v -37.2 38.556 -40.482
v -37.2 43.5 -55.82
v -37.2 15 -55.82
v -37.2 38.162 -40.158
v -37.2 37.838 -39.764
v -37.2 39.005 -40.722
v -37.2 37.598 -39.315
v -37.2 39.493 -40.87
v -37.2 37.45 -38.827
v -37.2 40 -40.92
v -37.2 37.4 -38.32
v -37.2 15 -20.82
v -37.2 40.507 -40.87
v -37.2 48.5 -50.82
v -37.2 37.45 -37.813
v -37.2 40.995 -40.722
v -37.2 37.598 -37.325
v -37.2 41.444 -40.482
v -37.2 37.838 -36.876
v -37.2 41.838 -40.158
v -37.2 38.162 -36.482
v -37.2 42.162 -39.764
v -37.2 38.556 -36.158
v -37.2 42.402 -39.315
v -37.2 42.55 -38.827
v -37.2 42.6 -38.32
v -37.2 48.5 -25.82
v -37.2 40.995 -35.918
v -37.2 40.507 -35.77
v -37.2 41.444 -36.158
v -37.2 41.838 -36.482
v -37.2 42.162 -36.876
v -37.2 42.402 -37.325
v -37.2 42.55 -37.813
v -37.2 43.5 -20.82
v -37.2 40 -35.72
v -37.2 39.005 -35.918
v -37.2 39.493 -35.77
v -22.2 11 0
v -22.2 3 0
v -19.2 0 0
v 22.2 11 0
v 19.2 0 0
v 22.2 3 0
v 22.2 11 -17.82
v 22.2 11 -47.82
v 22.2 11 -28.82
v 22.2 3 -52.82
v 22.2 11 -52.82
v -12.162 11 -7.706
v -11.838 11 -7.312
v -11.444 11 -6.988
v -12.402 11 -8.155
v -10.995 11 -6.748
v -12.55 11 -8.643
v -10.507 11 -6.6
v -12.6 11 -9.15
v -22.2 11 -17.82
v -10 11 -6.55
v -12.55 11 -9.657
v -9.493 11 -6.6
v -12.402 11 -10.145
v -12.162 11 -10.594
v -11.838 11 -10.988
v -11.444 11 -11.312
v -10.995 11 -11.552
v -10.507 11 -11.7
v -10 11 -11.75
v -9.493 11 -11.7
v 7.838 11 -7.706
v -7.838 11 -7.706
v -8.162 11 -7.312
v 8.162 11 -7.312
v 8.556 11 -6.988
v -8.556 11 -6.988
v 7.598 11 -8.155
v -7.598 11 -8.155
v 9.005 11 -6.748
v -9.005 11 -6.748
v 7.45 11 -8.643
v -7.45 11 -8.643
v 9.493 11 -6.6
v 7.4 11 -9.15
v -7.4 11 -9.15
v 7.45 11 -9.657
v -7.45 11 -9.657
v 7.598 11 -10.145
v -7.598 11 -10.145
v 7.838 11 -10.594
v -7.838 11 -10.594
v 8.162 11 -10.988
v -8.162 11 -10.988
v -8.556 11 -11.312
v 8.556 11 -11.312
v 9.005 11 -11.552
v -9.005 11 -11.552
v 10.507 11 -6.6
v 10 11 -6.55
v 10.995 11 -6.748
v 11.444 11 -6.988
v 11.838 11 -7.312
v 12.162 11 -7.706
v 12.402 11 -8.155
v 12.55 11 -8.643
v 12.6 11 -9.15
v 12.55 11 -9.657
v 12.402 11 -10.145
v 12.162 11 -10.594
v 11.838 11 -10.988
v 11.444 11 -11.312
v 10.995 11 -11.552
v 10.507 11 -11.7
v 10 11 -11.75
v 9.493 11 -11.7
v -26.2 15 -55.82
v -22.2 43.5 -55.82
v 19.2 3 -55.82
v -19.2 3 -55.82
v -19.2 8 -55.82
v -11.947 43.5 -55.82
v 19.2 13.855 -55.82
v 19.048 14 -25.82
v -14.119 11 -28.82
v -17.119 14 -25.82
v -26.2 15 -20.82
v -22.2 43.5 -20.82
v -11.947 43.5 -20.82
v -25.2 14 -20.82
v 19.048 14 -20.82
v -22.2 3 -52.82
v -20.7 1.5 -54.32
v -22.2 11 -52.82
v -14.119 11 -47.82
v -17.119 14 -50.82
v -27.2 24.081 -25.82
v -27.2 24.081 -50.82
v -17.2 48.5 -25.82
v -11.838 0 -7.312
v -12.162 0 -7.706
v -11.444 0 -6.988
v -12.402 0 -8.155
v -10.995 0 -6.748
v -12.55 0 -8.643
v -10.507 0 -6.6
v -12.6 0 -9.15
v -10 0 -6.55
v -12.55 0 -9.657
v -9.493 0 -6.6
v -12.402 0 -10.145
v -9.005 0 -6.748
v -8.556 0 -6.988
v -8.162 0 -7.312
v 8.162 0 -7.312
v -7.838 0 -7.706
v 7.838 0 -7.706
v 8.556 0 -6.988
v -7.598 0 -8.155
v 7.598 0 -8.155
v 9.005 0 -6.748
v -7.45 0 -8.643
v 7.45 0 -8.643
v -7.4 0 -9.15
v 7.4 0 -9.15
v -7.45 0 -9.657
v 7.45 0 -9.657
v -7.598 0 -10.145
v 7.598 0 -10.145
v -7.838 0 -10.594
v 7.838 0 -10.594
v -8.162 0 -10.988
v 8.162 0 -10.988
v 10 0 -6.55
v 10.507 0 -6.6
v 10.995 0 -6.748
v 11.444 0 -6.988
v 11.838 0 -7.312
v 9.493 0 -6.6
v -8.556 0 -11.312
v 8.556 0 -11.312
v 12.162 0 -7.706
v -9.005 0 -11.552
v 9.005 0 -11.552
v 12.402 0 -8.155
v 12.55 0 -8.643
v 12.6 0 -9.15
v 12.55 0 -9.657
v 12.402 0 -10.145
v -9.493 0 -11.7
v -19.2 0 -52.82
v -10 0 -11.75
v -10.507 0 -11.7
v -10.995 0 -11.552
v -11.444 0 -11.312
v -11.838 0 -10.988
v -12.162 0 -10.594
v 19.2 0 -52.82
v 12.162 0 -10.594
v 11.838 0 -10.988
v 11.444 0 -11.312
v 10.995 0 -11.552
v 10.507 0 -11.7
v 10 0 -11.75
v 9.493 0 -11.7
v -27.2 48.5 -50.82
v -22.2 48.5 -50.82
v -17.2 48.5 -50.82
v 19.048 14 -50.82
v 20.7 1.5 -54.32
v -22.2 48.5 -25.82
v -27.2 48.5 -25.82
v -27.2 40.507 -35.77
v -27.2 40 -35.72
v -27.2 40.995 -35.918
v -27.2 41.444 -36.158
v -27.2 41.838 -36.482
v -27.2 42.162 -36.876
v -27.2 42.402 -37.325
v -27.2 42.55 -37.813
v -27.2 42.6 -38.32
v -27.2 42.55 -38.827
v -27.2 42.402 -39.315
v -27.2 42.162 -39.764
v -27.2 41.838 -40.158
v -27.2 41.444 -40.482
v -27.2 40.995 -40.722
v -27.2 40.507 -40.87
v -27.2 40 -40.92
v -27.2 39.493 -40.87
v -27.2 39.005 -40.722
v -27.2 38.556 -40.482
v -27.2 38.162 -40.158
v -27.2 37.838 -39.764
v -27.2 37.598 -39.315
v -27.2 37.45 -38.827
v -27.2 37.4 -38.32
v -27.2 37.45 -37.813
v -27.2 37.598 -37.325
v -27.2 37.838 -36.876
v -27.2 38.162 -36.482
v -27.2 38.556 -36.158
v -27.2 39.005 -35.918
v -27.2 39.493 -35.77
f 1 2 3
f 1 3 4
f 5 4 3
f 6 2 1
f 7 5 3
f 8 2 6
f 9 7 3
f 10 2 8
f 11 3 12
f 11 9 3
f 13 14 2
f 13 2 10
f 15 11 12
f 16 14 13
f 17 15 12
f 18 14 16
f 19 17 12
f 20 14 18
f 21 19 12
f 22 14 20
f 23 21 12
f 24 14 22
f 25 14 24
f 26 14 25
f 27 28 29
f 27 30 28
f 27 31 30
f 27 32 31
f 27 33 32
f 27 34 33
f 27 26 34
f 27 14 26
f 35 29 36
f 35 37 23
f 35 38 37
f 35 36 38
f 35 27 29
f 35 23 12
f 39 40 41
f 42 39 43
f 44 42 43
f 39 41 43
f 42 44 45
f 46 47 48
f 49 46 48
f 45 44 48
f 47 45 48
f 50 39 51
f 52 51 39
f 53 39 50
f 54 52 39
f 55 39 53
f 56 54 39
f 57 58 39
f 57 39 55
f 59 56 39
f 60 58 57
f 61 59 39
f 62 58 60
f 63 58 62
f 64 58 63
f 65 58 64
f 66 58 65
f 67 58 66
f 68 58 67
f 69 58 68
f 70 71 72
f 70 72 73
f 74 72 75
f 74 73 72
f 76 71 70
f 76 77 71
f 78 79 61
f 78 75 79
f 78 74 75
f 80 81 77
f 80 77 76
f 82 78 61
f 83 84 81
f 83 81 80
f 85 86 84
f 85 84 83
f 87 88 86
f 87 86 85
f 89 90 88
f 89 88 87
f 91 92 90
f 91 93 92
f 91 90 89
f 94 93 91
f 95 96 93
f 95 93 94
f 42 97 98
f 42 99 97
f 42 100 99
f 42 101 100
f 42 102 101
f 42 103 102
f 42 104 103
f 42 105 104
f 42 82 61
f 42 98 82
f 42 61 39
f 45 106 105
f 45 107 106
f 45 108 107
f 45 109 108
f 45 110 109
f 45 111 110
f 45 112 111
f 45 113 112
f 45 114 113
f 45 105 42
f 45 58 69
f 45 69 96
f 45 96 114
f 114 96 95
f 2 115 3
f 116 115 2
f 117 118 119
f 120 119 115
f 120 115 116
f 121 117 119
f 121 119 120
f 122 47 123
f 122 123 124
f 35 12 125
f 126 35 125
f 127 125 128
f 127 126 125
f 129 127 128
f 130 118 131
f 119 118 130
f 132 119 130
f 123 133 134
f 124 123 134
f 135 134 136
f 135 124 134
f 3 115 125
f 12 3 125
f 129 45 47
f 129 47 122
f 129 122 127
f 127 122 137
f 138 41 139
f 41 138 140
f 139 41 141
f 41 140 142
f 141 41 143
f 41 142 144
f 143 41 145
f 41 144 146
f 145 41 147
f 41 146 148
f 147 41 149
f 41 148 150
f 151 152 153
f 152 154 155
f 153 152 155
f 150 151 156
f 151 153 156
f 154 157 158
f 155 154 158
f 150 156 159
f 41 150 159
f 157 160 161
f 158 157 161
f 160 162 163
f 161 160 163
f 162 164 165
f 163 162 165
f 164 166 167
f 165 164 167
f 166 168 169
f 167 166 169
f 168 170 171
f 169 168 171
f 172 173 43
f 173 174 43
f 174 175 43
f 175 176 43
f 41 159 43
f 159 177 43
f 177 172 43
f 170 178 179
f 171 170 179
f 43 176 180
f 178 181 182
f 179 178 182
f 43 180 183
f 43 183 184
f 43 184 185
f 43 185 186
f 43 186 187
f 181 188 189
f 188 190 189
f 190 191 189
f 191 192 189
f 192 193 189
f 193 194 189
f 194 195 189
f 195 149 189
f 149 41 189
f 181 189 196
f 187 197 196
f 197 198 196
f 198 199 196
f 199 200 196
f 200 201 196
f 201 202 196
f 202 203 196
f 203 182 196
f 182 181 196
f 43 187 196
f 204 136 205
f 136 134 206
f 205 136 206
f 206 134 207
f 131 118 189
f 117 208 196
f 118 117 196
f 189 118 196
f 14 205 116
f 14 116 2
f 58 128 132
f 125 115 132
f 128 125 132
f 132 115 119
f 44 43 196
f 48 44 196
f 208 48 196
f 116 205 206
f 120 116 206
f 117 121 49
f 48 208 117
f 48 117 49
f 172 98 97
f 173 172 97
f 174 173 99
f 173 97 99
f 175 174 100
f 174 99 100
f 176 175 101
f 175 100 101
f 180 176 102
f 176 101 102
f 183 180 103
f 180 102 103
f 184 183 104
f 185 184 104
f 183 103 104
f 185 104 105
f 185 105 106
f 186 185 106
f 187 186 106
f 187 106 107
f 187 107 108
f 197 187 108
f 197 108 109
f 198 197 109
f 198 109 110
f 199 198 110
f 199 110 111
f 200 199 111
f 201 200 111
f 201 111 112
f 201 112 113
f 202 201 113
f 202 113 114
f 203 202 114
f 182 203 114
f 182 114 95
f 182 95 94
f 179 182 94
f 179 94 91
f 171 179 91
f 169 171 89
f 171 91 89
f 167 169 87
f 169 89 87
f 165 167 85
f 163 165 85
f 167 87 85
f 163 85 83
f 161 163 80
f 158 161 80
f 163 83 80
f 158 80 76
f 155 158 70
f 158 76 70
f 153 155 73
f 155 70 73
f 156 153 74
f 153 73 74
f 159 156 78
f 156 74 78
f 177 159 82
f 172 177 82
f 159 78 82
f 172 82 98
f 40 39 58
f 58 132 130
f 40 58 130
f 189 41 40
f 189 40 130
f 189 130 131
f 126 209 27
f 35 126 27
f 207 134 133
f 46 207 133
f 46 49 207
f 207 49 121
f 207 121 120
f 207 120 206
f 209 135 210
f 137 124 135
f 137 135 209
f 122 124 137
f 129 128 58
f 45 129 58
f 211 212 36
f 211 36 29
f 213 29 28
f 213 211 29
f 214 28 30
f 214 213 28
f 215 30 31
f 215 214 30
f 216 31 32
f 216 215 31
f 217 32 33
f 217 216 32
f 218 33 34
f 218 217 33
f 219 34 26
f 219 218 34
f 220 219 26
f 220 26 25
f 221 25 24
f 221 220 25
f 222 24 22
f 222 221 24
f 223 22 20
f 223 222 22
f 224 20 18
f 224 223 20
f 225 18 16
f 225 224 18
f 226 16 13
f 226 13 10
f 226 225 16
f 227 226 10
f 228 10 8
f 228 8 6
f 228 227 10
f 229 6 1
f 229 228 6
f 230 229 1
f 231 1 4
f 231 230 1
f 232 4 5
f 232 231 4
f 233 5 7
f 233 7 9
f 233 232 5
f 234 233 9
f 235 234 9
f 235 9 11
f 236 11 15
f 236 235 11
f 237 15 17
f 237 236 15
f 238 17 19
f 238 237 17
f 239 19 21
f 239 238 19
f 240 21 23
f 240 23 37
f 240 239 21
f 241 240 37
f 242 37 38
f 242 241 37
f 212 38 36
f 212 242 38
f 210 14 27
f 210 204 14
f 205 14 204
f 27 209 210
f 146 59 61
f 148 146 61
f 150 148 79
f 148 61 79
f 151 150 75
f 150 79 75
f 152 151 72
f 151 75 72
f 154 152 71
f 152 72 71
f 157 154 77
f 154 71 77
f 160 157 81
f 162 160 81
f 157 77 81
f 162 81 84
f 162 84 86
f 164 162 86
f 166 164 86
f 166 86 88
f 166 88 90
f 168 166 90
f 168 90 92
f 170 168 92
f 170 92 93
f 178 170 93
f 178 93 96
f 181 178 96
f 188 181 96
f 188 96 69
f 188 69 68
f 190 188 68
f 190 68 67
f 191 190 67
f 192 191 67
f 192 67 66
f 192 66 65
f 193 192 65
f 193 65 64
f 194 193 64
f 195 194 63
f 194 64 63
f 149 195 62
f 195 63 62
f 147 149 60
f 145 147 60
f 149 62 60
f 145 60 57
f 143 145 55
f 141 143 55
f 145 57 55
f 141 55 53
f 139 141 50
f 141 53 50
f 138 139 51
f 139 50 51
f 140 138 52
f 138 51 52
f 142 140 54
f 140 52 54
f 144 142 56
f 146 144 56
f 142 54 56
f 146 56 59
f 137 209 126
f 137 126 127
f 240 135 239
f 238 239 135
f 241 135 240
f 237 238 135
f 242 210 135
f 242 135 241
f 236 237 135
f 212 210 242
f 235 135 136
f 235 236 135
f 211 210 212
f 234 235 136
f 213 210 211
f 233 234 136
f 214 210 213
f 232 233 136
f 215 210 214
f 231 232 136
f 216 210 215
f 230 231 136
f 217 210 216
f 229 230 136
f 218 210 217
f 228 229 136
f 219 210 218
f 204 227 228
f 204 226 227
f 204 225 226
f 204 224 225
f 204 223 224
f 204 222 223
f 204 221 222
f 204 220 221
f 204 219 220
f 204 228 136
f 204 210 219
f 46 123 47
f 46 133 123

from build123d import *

# Parameters (mm, degrees)
SKETCH2_W                = 44.4
SKETCH2_H                = 55.82
BOSS_EXTRUDE1_DEPTH      = 11
CHAMFER1_SIZE            = 3
SKETCH3_R                = 2.6
CUT_EXTRUDE1_DEPTH       = 62.071371362
SKETCH4_W                = 35
SKETCH4_H                = 37.5
SKETCH4_R                = 2.6
BOSS_EXTRUDE2_DEPTH      = 5
BOSS_EXTRUDE7_DEPTH      = 5
BOSS_EXTRUDE9_DEPTH      = 5
CHAMFER8_SIZE            = 5
BOSS_EXTRUDE11_OUTLINE_W = 35
BOSS_EXTRUDE11_OUTLINE_H = 33.5
BOSS_EXTRUDE11_OUTLINE_R = 2.6
BOSS_EXTRUDE11_DEPTH     = 15
CHAMFER10_SIZE           = 5
SKETCH13_W               = 25
SKETCH13_H               = 34.5
CUT_EXTRUDE2_DEPTH       = 10
BOSS_EXTRUDE12_REACH     = 72.435
BOSS_EXTRUDE13_DEPTH     = 25
CHAMFER11_SIZE           = 3


# Read off the part's stored shape, not the designer's step: Boss-Extrude11
# Some blends are built 0.0001 mm under size
with BuildPart() as part:
    # Sketch2 → Boss-Extrude1 (new body)
    with BuildSketch(Plane(origin=(0, 0, 0), x_dir=(1, 0, 0), z_dir=(0, 1, 0))):
        with Locations((0, 27.91)):
            Rectangle(SKETCH2_W, SKETCH2_H)
    extrude(amount=BOSS_EXTRUDE1_DEPTH)

    # Chamfer1
    chamfer1_edges = [part.edges().sort_by_distance(p)[0] for p in [
        (22.2, 0, -27.91),
        (-22.2, 0, -27.91),
    ]]
    chamfer(chamfer1_edges, length=CHAMFER1_SIZE)

    # Sketch3 → Cut-Extrude1 (cut, through all)
    with BuildSketch(Plane(origin=(0, 11, 0), x_dir=(1, 0, 0), z_dir=(0, 1, 0))):
        with Locations(Location((10, 9.15, 0), (0, 0, 270))):
            Circle(SKETCH3_R)
        with Locations(Location((-10, 9.15, 0), (0, 0, 270))):
            Circle(SKETCH3_R)
    extrude(amount=-CUT_EXTRUDE1_DEPTH, mode=Mode.SUBTRACT)

    # Sketch4 → Boss-Extrude2 (add)
    with BuildSketch(Plane.ZY.offset(22.2)):
        with Locations((-38.32, 29.75)):
            Rectangle(SKETCH4_W, SKETCH4_H)
        with Locations((-38.32, 40)):
            Circle(SKETCH4_R, mode=Mode.SUBTRACT)
    extrude(amount=-BOSS_EXTRUDE2_DEPTH)

    # Sketch8 → Boss-Extrude7 (add)
    with BuildSketch(Plane(origin=(0, 0, -55.82), x_dir=(-1, 0, 0), z_dir=(0, 0, -1))):
        Polygon((-22.2, 11), (22.2, 11), (22.2, 48.5), (17.2, 48.5), align=None)
    extrude(amount=-BOSS_EXTRUDE7_DEPTH)

    # Sketch9 → Boss-Extrude9 (add)
    with BuildSketch(Plane.XY.offset(-20.82)):
        Polygon((-22.2, 11), (-22.2, 48.5), (-17.2, 48.5), (22.2, 11), align=None)
    extrude(amount=-BOSS_EXTRUDE9_DEPTH)

    # Chamfer8
    chamfer8_edges = [part.edges().sort_by_distance(p)[0] for p in [
        (-19.7, 48.5, -20.82),
        (-19.7, 48.5, -55.82),
    ]]
    chamfer(chamfer8_edges, length=CHAMFER8_SIZE)

    # Boss-Extrude11 outline → Boss-Extrude11 (add)
    with BuildSketch(Plane.ZY.offset(22.2)):
        with Locations((-38.32, 31.75)):
            Rectangle(BOSS_EXTRUDE11_OUTLINE_W, BOSS_EXTRUDE11_OUTLINE_H)
        with Locations((-38.32, 40)):
            Circle(BOSS_EXTRUDE11_OUTLINE_R, mode=Mode.SUBTRACT)
    extrude(amount=BOSS_EXTRUDE11_DEPTH)

    # Chamfer10
    chamfer10_edges = [part.edges().sort_by_distance(p)[0] for p in [
        (-29.7, 48.5, -20.82),
        (-29.7, 48.5, -55.82),
    ]]
    chamfer(chamfer10_edges, length=CHAMFER10_SIZE - 0.0001)  # a hair under: the kernel refuses the full size

    # Sketch13 → Cut-Extrude2 (cut)
    with BuildSketch(Plane(origin=(-17.2, 0, 0), x_dir=(0, 0, -1), z_dir=(1, 0, 0))):
        with Locations((38.32, 31.25)):
            Rectangle(SKETCH13_W, SKETCH13_H)
    extrude(amount=-CUT_EXTRUDE2_DEPTH, mode=Mode.SUBTRACT)

    # Boss-Extrude12: up to this face of the body (flat: up to its plane)
    boss_extrude12_end = Plane(part.part.faces().sort_by_distance((-10.417387127, 20.265645238, -55.82))[0])
    # Sketch14 → Boss-Extrude12 (add, up to the picked face)
    with BuildSketch(Plane.XY.offset(-20.82), mode=Mode.PRIVATE) as boss_extrude12_sk1:
        Polygon((-22.2, 15), (-26.2, 15), (-22.2, 11), align=None)
    boss_extrude12_tool1 = split(extrude(boss_extrude12_sk1.sketch, amount=-BOSS_EXTRUDE12_REACH, mode=Mode.PRIVATE), bisect_by=boss_extrude12_end, keep=Keep.BOTH, mode=Mode.PRIVATE)
    add(boss_extrude12_tool1.solids().sort_by(Axis((-23.533333, 13.666667, -20.82), (0, 0, -1)))[0])

    # Sketch15 → Boss-Extrude13 (add)
    with BuildSketch(Plane(origin=(0, 0, -25.82), x_dir=(-1, 0, 0), z_dir=(0, 0, -1))):
        Polygon((14.118524548, 11), (27.2, 24.081475452), (27.2, 15), (22.2, 15), (22.2, 11), align=None)
    extrude(amount=BOSS_EXTRUDE13_DEPTH)

    # Chamfer11
    # the kernel refuses this chamfer: 3 mm, written as the material it adds along each edge
    with BuildSketch(Plane(origin=(22.2, 11, -50.82), x_dir=(0, 0.9996219169112968, -0.027495876610589085), z_dir=(-1, 0, 0))) as chamfer11_piece_1_section:
        Polygon((CHAMFER11_SIZE * 0.999621916911, -CHAMFER11_SIZE * 0.0274958766106), (-CHAMFER11_SIZE * 0.0274958766106, -CHAMFER11_SIZE * 0.999621916911), (0, 0), align=None)
    chamfer11_piece_1 = extrude(amount=44.033573512, mode=Mode.PRIVATE)
    chamfer11_piece_1 = split(chamfer11_piece_1, bisect_by=Plane(origin=(11.645849557, 21.045193949, -49.830255653), z_dir=(-0.689425602489498, -0.7243564996822992, 0)), keep=Keep.TOP, mode=Mode.PRIVATE)
    add(chamfer11_piece_1)
    with BuildSketch(Plane(origin=(22.2, 11, -25.82), x_dir=(0, -0.027495876610589064, -0.9996219169112965), z_dir=(-1, 0, 0))) as chamfer11_piece_2_section:
        Polygon((CHAMFER11_SIZE * 0.999621916911, -CHAMFER11_SIZE * 0.0274958766106), (-CHAMFER11_SIZE * 0.0274958766106, -CHAMFER11_SIZE * 0.999621916911), (0, 0), align=None)
    chamfer11_piece_2 = extrude(amount=44.033573512, mode=Mode.PRIVATE)
    chamfer11_piece_2 = split(chamfer11_piece_2, bisect_by=Plane(origin=(11.645849557, 21.045193949, -26.809744347), z_dir=(-0.6894256024894981, -0.7243564996822992, 0)), keep=Keep.TOP, mode=Mode.PRIVATE)
    add(chamfer11_piece_2)
    with BuildSketch(Plane(origin=(22.2, 11, -20.82), x_dir=(0, 0.9996219169112968, -0.027495876610587933), z_dir=(-1, 0, 0))) as chamfer11_piece_3_section:
        Polygon((CHAMFER11_SIZE * 0.999621916911, -CHAMFER11_SIZE * 0.0274958766106), (-CHAMFER11_SIZE * 0.0274958766106, -CHAMFER11_SIZE * 0.999621916911), (0, 0), align=None)
    chamfer11_piece_3 = extrude(amount=44.4, mode=Mode.PRIVATE)
    chamfer11_piece_3 = split(chamfer11_piece_3, bisect_by=Plane(origin=(9.795664895, 22.806156509, -19.82331844), z_dir=(-0.6894256024894981, -0.7243564996822992, 0)), keep=Keep.TOP, mode=Mode.PRIVATE)
    chamfer11_piece_3 = split(chamfer11_piece_3, bisect_by=Plane(origin=(-11.844103609, 0.644103609, -19.82331844), z_dir=(0.7071067811865474, 0.7071067811865477, 0)), keep=Keep.TOP, mode=Mode.PRIVATE)
    add(chamfer11_piece_3)
    with BuildSketch(Plane(origin=(22.2, 11, -20.82), x_dir=(0, 0.9996219169112968, -0.027495876610587933), z_dir=(-1, 0, 0))) as chamfer11_piece_4_section:
        Polygon((CHAMFER11_SIZE * 0.999621916911, -CHAMFER11_SIZE * 0.0274958766106), (-CHAMFER11_SIZE * 0.0274958766106, -CHAMFER11_SIZE * 0.999621916911), (0, 0), align=None)
    chamfer11_piece_4 = extrude(amount=52.115048964, mode=Mode.PRIVATE)
    chamfer11_piece_4 = split(chamfer11_piece_4, bisect_by=Plane(origin=(-23.372890722, 12.172890722, -20.136626916), z_dir=(0.7071067811865474, 0.7071067811865477, 0)), keep=Keep.TOP, mode=Mode.PRIVATE)
    chamfer11_piece_4 = split(chamfer11_piece_4, bisect_by=Plane(origin=(-22.2, 12.563854296, -20.136626916), z_dir=(-1, 0, 0)), keep=Keep.TOP, mode=Mode.PRIVATE)
    add(chamfer11_piece_4)
    # the kernel refuses this chamfer: 3 mm, written as the material it takes off along each edge
    with BuildSketch(Plane(origin=(-22.2, 18.715048964, -55.82), x_dir=(0.9996219169112965, 0, -0.02749587661058676), z_dir=(0, -1, 0))) as chamfer11_2_piece_1_section:
        Polygon((CHAMFER11_SIZE * 0.999621916911, CHAMFER11_SIZE * 0.0274958766106), (-CHAMFER11_SIZE * 0.0274958766106, CHAMFER11_SIZE * 0.999621916911), (0, 0), align=None)
    chamfer11_2_piece_1 = extrude(amount=23.430097928, mode=Mode.PRIVATE)
    chamfer11_2_piece_1 = split(chamfer11_2_piece_1, bisect_by=Plane(origin=(-17.558310603, 6.358310603, -54.809870411), z_dir=(-0.7071067811865474, -0.7071067811865477, 0)), keep=Keep.TOP, mode=Mode.PRIVATE)
    add(chamfer11_2_piece_1, mode=Mode.SUBTRACT)
    with BuildSketch(Plane(origin=(22.2, -4.715048964, -55.82), x_dir=(-0.9996219169112965, 0, -0.02749587661058676), z_dir=(0, 1, 0))) as chamfer11_2_piece_2:
        Polygon((CHAMFER11_SIZE * 0.999621916911, CHAMFER11_SIZE * 0.0274958766106), (-CHAMFER11_SIZE * 0.0274958766106, CHAMFER11_SIZE * 0.999621916911), (0, 0), align=None)
    extrude(amount=23.430097928, mode=Mode.SUBTRACT)
    with BuildSketch(Plane(origin=(26.915048964, 0, -55.82), x_dir=(0, 0.9996219169112968, -0.027495876610586778), z_dir=(-1, 0, 0))) as chamfer11_2_piece_3:
        Polygon((CHAMFER11_SIZE * 0.999621916911, -CHAMFER11_SIZE * 0.0274958766106), (-CHAMFER11_SIZE * 0.0274958766106, -CHAMFER11_SIZE * 0.999621916911), (0, 0), align=None)
    extrude(amount=53.830097928, mode=Mode.SUBTRACT)


solid = part.part
